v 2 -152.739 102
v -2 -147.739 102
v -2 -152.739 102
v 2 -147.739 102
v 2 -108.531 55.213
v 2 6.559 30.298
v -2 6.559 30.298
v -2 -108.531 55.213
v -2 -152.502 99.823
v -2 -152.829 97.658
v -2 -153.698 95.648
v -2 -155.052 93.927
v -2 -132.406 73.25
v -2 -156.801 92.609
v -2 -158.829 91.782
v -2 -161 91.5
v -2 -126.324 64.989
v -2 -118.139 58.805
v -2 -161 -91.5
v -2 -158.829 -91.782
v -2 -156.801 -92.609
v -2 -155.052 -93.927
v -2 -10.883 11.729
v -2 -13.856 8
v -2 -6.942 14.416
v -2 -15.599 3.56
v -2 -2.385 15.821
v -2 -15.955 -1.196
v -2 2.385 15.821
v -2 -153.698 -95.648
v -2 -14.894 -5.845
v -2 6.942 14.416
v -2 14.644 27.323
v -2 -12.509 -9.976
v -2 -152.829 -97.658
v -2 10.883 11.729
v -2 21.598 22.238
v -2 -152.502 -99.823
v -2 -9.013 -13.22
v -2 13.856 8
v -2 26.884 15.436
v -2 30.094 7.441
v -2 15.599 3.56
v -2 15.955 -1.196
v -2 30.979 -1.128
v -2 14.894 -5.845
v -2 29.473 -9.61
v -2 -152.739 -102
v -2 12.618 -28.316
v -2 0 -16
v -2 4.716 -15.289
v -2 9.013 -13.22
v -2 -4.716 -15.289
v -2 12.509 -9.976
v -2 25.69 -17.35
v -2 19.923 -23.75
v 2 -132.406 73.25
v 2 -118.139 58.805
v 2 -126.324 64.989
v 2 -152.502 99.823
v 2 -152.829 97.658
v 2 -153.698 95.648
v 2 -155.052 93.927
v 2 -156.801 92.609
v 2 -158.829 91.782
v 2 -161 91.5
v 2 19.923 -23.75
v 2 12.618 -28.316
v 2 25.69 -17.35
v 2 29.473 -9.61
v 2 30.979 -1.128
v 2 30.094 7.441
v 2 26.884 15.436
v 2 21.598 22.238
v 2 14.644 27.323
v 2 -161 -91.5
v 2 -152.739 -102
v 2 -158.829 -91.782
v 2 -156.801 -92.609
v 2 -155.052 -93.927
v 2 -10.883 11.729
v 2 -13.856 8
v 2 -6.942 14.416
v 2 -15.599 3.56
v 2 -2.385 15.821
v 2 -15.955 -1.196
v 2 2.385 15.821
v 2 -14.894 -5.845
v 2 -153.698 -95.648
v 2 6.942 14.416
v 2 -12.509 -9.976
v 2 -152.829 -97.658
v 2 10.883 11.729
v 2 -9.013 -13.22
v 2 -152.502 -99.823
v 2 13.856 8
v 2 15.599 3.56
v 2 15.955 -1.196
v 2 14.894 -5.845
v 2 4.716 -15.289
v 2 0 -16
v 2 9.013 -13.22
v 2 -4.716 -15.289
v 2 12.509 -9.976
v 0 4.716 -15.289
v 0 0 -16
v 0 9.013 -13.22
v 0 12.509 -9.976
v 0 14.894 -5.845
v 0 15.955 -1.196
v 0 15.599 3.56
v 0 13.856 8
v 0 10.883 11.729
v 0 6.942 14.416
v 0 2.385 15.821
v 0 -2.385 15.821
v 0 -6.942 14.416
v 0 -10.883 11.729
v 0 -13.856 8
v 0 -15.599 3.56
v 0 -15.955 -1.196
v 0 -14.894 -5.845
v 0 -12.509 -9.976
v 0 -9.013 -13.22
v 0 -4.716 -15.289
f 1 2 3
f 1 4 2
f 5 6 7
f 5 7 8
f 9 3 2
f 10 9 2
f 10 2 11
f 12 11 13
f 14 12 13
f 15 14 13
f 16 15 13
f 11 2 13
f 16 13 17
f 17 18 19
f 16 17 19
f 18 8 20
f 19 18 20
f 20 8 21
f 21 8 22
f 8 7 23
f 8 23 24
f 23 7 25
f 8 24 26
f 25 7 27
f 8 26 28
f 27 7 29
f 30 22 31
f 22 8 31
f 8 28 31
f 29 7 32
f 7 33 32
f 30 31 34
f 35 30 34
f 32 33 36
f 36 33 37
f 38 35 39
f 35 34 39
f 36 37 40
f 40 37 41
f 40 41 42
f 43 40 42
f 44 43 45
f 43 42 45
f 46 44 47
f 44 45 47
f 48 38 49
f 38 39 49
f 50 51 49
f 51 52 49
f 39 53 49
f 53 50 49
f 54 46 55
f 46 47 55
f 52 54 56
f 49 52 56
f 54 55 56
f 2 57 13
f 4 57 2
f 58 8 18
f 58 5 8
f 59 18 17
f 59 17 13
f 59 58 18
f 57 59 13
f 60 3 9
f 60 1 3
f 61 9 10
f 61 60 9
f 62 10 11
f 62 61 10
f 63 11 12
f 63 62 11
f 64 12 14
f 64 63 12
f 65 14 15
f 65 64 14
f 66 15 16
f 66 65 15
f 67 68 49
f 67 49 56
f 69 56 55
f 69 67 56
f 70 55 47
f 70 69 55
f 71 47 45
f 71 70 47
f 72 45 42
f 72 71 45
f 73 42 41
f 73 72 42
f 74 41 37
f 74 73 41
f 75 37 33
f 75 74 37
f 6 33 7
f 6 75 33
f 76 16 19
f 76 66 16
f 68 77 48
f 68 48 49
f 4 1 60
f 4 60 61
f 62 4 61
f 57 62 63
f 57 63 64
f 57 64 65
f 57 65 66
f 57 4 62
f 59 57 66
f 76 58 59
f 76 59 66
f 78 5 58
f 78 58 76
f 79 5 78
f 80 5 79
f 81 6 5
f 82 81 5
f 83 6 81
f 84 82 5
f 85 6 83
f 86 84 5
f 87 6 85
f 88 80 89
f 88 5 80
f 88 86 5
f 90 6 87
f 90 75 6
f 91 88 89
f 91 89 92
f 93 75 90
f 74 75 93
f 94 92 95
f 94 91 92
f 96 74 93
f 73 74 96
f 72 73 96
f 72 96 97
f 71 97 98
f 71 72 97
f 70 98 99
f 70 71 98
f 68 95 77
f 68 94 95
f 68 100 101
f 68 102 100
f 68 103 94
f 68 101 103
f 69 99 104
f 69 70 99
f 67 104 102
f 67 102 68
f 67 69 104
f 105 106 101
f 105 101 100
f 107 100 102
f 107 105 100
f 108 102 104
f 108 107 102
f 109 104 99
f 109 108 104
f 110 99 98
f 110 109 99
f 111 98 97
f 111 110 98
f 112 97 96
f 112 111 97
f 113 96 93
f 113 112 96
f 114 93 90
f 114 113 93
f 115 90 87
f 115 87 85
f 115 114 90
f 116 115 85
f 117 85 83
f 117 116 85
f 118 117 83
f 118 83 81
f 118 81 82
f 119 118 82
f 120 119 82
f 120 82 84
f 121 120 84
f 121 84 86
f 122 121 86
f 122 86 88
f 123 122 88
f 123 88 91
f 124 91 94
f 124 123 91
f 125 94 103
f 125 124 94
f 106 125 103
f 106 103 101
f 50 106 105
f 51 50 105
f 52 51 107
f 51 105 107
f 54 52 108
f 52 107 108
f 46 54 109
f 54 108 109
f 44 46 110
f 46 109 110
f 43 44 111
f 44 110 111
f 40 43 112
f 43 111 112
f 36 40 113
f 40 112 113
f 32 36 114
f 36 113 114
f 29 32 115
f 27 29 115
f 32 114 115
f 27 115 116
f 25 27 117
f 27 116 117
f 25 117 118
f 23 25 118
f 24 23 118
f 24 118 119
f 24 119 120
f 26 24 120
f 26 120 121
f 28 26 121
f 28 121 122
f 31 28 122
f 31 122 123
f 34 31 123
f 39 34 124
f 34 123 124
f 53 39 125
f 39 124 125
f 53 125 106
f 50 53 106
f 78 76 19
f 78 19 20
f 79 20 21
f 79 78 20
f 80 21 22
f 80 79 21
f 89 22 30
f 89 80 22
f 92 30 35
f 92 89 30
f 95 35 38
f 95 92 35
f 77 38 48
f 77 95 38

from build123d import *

# Parameters (mm, degrees)
EXTRUDE_1_DEPTH      = 2
EXTRUDE_1_DEPTH_BACK = 2
SKETCH_1_R           = 16


with BuildPart() as part:
    # Эскиз1 → Бобышка-Вытянуть1 (new, two sides: drawn at the far end of the back side and taken through both)
    with BuildSketch(Plane(origin=(0, 0, 0), x_dir=(0, 0, -1), z_dir=(1, 0, 0)).offset(-EXTRUDE_1_DEPTH_BACK)):
        with BuildLine():
            Line((-91.5, -161), (91.5, -161))
            ThreePointArc((91.5, -161), (94.74405099, -154.319805392), (102, -152.738644179))
            Line((102, -152.738644179), (28.315921349, 12.617788956))
            ThreePointArc((28.315921349, 12.617788956), (-3.187422672, 30.835699063), (-30.298183379, 6.55896973))
            Line((-30.298183379, 6.55896973), (-55.212875562, -108.530738505))
            ThreePointArc((-55.212875562, -108.530738505), (-61.600879697, -122.455675592), (-73.25038996, -132.405518825))
            Line((-73.25038996, -132.405518825), (-102, -147.738644179))
            Line((-102, -147.738644179), (-102, -152.738644179))
            ThreePointArc((-102, -152.738644179), (-94.74405099, -154.319805392), (-91.5, -161))
        make_face()
        Circle(SKETCH_1_R, mode=Mode.SUBTRACT)
    extrude(amount=EXTRUDE_1_DEPTH + EXTRUDE_1_DEPTH_BACK)


solid = part.part
